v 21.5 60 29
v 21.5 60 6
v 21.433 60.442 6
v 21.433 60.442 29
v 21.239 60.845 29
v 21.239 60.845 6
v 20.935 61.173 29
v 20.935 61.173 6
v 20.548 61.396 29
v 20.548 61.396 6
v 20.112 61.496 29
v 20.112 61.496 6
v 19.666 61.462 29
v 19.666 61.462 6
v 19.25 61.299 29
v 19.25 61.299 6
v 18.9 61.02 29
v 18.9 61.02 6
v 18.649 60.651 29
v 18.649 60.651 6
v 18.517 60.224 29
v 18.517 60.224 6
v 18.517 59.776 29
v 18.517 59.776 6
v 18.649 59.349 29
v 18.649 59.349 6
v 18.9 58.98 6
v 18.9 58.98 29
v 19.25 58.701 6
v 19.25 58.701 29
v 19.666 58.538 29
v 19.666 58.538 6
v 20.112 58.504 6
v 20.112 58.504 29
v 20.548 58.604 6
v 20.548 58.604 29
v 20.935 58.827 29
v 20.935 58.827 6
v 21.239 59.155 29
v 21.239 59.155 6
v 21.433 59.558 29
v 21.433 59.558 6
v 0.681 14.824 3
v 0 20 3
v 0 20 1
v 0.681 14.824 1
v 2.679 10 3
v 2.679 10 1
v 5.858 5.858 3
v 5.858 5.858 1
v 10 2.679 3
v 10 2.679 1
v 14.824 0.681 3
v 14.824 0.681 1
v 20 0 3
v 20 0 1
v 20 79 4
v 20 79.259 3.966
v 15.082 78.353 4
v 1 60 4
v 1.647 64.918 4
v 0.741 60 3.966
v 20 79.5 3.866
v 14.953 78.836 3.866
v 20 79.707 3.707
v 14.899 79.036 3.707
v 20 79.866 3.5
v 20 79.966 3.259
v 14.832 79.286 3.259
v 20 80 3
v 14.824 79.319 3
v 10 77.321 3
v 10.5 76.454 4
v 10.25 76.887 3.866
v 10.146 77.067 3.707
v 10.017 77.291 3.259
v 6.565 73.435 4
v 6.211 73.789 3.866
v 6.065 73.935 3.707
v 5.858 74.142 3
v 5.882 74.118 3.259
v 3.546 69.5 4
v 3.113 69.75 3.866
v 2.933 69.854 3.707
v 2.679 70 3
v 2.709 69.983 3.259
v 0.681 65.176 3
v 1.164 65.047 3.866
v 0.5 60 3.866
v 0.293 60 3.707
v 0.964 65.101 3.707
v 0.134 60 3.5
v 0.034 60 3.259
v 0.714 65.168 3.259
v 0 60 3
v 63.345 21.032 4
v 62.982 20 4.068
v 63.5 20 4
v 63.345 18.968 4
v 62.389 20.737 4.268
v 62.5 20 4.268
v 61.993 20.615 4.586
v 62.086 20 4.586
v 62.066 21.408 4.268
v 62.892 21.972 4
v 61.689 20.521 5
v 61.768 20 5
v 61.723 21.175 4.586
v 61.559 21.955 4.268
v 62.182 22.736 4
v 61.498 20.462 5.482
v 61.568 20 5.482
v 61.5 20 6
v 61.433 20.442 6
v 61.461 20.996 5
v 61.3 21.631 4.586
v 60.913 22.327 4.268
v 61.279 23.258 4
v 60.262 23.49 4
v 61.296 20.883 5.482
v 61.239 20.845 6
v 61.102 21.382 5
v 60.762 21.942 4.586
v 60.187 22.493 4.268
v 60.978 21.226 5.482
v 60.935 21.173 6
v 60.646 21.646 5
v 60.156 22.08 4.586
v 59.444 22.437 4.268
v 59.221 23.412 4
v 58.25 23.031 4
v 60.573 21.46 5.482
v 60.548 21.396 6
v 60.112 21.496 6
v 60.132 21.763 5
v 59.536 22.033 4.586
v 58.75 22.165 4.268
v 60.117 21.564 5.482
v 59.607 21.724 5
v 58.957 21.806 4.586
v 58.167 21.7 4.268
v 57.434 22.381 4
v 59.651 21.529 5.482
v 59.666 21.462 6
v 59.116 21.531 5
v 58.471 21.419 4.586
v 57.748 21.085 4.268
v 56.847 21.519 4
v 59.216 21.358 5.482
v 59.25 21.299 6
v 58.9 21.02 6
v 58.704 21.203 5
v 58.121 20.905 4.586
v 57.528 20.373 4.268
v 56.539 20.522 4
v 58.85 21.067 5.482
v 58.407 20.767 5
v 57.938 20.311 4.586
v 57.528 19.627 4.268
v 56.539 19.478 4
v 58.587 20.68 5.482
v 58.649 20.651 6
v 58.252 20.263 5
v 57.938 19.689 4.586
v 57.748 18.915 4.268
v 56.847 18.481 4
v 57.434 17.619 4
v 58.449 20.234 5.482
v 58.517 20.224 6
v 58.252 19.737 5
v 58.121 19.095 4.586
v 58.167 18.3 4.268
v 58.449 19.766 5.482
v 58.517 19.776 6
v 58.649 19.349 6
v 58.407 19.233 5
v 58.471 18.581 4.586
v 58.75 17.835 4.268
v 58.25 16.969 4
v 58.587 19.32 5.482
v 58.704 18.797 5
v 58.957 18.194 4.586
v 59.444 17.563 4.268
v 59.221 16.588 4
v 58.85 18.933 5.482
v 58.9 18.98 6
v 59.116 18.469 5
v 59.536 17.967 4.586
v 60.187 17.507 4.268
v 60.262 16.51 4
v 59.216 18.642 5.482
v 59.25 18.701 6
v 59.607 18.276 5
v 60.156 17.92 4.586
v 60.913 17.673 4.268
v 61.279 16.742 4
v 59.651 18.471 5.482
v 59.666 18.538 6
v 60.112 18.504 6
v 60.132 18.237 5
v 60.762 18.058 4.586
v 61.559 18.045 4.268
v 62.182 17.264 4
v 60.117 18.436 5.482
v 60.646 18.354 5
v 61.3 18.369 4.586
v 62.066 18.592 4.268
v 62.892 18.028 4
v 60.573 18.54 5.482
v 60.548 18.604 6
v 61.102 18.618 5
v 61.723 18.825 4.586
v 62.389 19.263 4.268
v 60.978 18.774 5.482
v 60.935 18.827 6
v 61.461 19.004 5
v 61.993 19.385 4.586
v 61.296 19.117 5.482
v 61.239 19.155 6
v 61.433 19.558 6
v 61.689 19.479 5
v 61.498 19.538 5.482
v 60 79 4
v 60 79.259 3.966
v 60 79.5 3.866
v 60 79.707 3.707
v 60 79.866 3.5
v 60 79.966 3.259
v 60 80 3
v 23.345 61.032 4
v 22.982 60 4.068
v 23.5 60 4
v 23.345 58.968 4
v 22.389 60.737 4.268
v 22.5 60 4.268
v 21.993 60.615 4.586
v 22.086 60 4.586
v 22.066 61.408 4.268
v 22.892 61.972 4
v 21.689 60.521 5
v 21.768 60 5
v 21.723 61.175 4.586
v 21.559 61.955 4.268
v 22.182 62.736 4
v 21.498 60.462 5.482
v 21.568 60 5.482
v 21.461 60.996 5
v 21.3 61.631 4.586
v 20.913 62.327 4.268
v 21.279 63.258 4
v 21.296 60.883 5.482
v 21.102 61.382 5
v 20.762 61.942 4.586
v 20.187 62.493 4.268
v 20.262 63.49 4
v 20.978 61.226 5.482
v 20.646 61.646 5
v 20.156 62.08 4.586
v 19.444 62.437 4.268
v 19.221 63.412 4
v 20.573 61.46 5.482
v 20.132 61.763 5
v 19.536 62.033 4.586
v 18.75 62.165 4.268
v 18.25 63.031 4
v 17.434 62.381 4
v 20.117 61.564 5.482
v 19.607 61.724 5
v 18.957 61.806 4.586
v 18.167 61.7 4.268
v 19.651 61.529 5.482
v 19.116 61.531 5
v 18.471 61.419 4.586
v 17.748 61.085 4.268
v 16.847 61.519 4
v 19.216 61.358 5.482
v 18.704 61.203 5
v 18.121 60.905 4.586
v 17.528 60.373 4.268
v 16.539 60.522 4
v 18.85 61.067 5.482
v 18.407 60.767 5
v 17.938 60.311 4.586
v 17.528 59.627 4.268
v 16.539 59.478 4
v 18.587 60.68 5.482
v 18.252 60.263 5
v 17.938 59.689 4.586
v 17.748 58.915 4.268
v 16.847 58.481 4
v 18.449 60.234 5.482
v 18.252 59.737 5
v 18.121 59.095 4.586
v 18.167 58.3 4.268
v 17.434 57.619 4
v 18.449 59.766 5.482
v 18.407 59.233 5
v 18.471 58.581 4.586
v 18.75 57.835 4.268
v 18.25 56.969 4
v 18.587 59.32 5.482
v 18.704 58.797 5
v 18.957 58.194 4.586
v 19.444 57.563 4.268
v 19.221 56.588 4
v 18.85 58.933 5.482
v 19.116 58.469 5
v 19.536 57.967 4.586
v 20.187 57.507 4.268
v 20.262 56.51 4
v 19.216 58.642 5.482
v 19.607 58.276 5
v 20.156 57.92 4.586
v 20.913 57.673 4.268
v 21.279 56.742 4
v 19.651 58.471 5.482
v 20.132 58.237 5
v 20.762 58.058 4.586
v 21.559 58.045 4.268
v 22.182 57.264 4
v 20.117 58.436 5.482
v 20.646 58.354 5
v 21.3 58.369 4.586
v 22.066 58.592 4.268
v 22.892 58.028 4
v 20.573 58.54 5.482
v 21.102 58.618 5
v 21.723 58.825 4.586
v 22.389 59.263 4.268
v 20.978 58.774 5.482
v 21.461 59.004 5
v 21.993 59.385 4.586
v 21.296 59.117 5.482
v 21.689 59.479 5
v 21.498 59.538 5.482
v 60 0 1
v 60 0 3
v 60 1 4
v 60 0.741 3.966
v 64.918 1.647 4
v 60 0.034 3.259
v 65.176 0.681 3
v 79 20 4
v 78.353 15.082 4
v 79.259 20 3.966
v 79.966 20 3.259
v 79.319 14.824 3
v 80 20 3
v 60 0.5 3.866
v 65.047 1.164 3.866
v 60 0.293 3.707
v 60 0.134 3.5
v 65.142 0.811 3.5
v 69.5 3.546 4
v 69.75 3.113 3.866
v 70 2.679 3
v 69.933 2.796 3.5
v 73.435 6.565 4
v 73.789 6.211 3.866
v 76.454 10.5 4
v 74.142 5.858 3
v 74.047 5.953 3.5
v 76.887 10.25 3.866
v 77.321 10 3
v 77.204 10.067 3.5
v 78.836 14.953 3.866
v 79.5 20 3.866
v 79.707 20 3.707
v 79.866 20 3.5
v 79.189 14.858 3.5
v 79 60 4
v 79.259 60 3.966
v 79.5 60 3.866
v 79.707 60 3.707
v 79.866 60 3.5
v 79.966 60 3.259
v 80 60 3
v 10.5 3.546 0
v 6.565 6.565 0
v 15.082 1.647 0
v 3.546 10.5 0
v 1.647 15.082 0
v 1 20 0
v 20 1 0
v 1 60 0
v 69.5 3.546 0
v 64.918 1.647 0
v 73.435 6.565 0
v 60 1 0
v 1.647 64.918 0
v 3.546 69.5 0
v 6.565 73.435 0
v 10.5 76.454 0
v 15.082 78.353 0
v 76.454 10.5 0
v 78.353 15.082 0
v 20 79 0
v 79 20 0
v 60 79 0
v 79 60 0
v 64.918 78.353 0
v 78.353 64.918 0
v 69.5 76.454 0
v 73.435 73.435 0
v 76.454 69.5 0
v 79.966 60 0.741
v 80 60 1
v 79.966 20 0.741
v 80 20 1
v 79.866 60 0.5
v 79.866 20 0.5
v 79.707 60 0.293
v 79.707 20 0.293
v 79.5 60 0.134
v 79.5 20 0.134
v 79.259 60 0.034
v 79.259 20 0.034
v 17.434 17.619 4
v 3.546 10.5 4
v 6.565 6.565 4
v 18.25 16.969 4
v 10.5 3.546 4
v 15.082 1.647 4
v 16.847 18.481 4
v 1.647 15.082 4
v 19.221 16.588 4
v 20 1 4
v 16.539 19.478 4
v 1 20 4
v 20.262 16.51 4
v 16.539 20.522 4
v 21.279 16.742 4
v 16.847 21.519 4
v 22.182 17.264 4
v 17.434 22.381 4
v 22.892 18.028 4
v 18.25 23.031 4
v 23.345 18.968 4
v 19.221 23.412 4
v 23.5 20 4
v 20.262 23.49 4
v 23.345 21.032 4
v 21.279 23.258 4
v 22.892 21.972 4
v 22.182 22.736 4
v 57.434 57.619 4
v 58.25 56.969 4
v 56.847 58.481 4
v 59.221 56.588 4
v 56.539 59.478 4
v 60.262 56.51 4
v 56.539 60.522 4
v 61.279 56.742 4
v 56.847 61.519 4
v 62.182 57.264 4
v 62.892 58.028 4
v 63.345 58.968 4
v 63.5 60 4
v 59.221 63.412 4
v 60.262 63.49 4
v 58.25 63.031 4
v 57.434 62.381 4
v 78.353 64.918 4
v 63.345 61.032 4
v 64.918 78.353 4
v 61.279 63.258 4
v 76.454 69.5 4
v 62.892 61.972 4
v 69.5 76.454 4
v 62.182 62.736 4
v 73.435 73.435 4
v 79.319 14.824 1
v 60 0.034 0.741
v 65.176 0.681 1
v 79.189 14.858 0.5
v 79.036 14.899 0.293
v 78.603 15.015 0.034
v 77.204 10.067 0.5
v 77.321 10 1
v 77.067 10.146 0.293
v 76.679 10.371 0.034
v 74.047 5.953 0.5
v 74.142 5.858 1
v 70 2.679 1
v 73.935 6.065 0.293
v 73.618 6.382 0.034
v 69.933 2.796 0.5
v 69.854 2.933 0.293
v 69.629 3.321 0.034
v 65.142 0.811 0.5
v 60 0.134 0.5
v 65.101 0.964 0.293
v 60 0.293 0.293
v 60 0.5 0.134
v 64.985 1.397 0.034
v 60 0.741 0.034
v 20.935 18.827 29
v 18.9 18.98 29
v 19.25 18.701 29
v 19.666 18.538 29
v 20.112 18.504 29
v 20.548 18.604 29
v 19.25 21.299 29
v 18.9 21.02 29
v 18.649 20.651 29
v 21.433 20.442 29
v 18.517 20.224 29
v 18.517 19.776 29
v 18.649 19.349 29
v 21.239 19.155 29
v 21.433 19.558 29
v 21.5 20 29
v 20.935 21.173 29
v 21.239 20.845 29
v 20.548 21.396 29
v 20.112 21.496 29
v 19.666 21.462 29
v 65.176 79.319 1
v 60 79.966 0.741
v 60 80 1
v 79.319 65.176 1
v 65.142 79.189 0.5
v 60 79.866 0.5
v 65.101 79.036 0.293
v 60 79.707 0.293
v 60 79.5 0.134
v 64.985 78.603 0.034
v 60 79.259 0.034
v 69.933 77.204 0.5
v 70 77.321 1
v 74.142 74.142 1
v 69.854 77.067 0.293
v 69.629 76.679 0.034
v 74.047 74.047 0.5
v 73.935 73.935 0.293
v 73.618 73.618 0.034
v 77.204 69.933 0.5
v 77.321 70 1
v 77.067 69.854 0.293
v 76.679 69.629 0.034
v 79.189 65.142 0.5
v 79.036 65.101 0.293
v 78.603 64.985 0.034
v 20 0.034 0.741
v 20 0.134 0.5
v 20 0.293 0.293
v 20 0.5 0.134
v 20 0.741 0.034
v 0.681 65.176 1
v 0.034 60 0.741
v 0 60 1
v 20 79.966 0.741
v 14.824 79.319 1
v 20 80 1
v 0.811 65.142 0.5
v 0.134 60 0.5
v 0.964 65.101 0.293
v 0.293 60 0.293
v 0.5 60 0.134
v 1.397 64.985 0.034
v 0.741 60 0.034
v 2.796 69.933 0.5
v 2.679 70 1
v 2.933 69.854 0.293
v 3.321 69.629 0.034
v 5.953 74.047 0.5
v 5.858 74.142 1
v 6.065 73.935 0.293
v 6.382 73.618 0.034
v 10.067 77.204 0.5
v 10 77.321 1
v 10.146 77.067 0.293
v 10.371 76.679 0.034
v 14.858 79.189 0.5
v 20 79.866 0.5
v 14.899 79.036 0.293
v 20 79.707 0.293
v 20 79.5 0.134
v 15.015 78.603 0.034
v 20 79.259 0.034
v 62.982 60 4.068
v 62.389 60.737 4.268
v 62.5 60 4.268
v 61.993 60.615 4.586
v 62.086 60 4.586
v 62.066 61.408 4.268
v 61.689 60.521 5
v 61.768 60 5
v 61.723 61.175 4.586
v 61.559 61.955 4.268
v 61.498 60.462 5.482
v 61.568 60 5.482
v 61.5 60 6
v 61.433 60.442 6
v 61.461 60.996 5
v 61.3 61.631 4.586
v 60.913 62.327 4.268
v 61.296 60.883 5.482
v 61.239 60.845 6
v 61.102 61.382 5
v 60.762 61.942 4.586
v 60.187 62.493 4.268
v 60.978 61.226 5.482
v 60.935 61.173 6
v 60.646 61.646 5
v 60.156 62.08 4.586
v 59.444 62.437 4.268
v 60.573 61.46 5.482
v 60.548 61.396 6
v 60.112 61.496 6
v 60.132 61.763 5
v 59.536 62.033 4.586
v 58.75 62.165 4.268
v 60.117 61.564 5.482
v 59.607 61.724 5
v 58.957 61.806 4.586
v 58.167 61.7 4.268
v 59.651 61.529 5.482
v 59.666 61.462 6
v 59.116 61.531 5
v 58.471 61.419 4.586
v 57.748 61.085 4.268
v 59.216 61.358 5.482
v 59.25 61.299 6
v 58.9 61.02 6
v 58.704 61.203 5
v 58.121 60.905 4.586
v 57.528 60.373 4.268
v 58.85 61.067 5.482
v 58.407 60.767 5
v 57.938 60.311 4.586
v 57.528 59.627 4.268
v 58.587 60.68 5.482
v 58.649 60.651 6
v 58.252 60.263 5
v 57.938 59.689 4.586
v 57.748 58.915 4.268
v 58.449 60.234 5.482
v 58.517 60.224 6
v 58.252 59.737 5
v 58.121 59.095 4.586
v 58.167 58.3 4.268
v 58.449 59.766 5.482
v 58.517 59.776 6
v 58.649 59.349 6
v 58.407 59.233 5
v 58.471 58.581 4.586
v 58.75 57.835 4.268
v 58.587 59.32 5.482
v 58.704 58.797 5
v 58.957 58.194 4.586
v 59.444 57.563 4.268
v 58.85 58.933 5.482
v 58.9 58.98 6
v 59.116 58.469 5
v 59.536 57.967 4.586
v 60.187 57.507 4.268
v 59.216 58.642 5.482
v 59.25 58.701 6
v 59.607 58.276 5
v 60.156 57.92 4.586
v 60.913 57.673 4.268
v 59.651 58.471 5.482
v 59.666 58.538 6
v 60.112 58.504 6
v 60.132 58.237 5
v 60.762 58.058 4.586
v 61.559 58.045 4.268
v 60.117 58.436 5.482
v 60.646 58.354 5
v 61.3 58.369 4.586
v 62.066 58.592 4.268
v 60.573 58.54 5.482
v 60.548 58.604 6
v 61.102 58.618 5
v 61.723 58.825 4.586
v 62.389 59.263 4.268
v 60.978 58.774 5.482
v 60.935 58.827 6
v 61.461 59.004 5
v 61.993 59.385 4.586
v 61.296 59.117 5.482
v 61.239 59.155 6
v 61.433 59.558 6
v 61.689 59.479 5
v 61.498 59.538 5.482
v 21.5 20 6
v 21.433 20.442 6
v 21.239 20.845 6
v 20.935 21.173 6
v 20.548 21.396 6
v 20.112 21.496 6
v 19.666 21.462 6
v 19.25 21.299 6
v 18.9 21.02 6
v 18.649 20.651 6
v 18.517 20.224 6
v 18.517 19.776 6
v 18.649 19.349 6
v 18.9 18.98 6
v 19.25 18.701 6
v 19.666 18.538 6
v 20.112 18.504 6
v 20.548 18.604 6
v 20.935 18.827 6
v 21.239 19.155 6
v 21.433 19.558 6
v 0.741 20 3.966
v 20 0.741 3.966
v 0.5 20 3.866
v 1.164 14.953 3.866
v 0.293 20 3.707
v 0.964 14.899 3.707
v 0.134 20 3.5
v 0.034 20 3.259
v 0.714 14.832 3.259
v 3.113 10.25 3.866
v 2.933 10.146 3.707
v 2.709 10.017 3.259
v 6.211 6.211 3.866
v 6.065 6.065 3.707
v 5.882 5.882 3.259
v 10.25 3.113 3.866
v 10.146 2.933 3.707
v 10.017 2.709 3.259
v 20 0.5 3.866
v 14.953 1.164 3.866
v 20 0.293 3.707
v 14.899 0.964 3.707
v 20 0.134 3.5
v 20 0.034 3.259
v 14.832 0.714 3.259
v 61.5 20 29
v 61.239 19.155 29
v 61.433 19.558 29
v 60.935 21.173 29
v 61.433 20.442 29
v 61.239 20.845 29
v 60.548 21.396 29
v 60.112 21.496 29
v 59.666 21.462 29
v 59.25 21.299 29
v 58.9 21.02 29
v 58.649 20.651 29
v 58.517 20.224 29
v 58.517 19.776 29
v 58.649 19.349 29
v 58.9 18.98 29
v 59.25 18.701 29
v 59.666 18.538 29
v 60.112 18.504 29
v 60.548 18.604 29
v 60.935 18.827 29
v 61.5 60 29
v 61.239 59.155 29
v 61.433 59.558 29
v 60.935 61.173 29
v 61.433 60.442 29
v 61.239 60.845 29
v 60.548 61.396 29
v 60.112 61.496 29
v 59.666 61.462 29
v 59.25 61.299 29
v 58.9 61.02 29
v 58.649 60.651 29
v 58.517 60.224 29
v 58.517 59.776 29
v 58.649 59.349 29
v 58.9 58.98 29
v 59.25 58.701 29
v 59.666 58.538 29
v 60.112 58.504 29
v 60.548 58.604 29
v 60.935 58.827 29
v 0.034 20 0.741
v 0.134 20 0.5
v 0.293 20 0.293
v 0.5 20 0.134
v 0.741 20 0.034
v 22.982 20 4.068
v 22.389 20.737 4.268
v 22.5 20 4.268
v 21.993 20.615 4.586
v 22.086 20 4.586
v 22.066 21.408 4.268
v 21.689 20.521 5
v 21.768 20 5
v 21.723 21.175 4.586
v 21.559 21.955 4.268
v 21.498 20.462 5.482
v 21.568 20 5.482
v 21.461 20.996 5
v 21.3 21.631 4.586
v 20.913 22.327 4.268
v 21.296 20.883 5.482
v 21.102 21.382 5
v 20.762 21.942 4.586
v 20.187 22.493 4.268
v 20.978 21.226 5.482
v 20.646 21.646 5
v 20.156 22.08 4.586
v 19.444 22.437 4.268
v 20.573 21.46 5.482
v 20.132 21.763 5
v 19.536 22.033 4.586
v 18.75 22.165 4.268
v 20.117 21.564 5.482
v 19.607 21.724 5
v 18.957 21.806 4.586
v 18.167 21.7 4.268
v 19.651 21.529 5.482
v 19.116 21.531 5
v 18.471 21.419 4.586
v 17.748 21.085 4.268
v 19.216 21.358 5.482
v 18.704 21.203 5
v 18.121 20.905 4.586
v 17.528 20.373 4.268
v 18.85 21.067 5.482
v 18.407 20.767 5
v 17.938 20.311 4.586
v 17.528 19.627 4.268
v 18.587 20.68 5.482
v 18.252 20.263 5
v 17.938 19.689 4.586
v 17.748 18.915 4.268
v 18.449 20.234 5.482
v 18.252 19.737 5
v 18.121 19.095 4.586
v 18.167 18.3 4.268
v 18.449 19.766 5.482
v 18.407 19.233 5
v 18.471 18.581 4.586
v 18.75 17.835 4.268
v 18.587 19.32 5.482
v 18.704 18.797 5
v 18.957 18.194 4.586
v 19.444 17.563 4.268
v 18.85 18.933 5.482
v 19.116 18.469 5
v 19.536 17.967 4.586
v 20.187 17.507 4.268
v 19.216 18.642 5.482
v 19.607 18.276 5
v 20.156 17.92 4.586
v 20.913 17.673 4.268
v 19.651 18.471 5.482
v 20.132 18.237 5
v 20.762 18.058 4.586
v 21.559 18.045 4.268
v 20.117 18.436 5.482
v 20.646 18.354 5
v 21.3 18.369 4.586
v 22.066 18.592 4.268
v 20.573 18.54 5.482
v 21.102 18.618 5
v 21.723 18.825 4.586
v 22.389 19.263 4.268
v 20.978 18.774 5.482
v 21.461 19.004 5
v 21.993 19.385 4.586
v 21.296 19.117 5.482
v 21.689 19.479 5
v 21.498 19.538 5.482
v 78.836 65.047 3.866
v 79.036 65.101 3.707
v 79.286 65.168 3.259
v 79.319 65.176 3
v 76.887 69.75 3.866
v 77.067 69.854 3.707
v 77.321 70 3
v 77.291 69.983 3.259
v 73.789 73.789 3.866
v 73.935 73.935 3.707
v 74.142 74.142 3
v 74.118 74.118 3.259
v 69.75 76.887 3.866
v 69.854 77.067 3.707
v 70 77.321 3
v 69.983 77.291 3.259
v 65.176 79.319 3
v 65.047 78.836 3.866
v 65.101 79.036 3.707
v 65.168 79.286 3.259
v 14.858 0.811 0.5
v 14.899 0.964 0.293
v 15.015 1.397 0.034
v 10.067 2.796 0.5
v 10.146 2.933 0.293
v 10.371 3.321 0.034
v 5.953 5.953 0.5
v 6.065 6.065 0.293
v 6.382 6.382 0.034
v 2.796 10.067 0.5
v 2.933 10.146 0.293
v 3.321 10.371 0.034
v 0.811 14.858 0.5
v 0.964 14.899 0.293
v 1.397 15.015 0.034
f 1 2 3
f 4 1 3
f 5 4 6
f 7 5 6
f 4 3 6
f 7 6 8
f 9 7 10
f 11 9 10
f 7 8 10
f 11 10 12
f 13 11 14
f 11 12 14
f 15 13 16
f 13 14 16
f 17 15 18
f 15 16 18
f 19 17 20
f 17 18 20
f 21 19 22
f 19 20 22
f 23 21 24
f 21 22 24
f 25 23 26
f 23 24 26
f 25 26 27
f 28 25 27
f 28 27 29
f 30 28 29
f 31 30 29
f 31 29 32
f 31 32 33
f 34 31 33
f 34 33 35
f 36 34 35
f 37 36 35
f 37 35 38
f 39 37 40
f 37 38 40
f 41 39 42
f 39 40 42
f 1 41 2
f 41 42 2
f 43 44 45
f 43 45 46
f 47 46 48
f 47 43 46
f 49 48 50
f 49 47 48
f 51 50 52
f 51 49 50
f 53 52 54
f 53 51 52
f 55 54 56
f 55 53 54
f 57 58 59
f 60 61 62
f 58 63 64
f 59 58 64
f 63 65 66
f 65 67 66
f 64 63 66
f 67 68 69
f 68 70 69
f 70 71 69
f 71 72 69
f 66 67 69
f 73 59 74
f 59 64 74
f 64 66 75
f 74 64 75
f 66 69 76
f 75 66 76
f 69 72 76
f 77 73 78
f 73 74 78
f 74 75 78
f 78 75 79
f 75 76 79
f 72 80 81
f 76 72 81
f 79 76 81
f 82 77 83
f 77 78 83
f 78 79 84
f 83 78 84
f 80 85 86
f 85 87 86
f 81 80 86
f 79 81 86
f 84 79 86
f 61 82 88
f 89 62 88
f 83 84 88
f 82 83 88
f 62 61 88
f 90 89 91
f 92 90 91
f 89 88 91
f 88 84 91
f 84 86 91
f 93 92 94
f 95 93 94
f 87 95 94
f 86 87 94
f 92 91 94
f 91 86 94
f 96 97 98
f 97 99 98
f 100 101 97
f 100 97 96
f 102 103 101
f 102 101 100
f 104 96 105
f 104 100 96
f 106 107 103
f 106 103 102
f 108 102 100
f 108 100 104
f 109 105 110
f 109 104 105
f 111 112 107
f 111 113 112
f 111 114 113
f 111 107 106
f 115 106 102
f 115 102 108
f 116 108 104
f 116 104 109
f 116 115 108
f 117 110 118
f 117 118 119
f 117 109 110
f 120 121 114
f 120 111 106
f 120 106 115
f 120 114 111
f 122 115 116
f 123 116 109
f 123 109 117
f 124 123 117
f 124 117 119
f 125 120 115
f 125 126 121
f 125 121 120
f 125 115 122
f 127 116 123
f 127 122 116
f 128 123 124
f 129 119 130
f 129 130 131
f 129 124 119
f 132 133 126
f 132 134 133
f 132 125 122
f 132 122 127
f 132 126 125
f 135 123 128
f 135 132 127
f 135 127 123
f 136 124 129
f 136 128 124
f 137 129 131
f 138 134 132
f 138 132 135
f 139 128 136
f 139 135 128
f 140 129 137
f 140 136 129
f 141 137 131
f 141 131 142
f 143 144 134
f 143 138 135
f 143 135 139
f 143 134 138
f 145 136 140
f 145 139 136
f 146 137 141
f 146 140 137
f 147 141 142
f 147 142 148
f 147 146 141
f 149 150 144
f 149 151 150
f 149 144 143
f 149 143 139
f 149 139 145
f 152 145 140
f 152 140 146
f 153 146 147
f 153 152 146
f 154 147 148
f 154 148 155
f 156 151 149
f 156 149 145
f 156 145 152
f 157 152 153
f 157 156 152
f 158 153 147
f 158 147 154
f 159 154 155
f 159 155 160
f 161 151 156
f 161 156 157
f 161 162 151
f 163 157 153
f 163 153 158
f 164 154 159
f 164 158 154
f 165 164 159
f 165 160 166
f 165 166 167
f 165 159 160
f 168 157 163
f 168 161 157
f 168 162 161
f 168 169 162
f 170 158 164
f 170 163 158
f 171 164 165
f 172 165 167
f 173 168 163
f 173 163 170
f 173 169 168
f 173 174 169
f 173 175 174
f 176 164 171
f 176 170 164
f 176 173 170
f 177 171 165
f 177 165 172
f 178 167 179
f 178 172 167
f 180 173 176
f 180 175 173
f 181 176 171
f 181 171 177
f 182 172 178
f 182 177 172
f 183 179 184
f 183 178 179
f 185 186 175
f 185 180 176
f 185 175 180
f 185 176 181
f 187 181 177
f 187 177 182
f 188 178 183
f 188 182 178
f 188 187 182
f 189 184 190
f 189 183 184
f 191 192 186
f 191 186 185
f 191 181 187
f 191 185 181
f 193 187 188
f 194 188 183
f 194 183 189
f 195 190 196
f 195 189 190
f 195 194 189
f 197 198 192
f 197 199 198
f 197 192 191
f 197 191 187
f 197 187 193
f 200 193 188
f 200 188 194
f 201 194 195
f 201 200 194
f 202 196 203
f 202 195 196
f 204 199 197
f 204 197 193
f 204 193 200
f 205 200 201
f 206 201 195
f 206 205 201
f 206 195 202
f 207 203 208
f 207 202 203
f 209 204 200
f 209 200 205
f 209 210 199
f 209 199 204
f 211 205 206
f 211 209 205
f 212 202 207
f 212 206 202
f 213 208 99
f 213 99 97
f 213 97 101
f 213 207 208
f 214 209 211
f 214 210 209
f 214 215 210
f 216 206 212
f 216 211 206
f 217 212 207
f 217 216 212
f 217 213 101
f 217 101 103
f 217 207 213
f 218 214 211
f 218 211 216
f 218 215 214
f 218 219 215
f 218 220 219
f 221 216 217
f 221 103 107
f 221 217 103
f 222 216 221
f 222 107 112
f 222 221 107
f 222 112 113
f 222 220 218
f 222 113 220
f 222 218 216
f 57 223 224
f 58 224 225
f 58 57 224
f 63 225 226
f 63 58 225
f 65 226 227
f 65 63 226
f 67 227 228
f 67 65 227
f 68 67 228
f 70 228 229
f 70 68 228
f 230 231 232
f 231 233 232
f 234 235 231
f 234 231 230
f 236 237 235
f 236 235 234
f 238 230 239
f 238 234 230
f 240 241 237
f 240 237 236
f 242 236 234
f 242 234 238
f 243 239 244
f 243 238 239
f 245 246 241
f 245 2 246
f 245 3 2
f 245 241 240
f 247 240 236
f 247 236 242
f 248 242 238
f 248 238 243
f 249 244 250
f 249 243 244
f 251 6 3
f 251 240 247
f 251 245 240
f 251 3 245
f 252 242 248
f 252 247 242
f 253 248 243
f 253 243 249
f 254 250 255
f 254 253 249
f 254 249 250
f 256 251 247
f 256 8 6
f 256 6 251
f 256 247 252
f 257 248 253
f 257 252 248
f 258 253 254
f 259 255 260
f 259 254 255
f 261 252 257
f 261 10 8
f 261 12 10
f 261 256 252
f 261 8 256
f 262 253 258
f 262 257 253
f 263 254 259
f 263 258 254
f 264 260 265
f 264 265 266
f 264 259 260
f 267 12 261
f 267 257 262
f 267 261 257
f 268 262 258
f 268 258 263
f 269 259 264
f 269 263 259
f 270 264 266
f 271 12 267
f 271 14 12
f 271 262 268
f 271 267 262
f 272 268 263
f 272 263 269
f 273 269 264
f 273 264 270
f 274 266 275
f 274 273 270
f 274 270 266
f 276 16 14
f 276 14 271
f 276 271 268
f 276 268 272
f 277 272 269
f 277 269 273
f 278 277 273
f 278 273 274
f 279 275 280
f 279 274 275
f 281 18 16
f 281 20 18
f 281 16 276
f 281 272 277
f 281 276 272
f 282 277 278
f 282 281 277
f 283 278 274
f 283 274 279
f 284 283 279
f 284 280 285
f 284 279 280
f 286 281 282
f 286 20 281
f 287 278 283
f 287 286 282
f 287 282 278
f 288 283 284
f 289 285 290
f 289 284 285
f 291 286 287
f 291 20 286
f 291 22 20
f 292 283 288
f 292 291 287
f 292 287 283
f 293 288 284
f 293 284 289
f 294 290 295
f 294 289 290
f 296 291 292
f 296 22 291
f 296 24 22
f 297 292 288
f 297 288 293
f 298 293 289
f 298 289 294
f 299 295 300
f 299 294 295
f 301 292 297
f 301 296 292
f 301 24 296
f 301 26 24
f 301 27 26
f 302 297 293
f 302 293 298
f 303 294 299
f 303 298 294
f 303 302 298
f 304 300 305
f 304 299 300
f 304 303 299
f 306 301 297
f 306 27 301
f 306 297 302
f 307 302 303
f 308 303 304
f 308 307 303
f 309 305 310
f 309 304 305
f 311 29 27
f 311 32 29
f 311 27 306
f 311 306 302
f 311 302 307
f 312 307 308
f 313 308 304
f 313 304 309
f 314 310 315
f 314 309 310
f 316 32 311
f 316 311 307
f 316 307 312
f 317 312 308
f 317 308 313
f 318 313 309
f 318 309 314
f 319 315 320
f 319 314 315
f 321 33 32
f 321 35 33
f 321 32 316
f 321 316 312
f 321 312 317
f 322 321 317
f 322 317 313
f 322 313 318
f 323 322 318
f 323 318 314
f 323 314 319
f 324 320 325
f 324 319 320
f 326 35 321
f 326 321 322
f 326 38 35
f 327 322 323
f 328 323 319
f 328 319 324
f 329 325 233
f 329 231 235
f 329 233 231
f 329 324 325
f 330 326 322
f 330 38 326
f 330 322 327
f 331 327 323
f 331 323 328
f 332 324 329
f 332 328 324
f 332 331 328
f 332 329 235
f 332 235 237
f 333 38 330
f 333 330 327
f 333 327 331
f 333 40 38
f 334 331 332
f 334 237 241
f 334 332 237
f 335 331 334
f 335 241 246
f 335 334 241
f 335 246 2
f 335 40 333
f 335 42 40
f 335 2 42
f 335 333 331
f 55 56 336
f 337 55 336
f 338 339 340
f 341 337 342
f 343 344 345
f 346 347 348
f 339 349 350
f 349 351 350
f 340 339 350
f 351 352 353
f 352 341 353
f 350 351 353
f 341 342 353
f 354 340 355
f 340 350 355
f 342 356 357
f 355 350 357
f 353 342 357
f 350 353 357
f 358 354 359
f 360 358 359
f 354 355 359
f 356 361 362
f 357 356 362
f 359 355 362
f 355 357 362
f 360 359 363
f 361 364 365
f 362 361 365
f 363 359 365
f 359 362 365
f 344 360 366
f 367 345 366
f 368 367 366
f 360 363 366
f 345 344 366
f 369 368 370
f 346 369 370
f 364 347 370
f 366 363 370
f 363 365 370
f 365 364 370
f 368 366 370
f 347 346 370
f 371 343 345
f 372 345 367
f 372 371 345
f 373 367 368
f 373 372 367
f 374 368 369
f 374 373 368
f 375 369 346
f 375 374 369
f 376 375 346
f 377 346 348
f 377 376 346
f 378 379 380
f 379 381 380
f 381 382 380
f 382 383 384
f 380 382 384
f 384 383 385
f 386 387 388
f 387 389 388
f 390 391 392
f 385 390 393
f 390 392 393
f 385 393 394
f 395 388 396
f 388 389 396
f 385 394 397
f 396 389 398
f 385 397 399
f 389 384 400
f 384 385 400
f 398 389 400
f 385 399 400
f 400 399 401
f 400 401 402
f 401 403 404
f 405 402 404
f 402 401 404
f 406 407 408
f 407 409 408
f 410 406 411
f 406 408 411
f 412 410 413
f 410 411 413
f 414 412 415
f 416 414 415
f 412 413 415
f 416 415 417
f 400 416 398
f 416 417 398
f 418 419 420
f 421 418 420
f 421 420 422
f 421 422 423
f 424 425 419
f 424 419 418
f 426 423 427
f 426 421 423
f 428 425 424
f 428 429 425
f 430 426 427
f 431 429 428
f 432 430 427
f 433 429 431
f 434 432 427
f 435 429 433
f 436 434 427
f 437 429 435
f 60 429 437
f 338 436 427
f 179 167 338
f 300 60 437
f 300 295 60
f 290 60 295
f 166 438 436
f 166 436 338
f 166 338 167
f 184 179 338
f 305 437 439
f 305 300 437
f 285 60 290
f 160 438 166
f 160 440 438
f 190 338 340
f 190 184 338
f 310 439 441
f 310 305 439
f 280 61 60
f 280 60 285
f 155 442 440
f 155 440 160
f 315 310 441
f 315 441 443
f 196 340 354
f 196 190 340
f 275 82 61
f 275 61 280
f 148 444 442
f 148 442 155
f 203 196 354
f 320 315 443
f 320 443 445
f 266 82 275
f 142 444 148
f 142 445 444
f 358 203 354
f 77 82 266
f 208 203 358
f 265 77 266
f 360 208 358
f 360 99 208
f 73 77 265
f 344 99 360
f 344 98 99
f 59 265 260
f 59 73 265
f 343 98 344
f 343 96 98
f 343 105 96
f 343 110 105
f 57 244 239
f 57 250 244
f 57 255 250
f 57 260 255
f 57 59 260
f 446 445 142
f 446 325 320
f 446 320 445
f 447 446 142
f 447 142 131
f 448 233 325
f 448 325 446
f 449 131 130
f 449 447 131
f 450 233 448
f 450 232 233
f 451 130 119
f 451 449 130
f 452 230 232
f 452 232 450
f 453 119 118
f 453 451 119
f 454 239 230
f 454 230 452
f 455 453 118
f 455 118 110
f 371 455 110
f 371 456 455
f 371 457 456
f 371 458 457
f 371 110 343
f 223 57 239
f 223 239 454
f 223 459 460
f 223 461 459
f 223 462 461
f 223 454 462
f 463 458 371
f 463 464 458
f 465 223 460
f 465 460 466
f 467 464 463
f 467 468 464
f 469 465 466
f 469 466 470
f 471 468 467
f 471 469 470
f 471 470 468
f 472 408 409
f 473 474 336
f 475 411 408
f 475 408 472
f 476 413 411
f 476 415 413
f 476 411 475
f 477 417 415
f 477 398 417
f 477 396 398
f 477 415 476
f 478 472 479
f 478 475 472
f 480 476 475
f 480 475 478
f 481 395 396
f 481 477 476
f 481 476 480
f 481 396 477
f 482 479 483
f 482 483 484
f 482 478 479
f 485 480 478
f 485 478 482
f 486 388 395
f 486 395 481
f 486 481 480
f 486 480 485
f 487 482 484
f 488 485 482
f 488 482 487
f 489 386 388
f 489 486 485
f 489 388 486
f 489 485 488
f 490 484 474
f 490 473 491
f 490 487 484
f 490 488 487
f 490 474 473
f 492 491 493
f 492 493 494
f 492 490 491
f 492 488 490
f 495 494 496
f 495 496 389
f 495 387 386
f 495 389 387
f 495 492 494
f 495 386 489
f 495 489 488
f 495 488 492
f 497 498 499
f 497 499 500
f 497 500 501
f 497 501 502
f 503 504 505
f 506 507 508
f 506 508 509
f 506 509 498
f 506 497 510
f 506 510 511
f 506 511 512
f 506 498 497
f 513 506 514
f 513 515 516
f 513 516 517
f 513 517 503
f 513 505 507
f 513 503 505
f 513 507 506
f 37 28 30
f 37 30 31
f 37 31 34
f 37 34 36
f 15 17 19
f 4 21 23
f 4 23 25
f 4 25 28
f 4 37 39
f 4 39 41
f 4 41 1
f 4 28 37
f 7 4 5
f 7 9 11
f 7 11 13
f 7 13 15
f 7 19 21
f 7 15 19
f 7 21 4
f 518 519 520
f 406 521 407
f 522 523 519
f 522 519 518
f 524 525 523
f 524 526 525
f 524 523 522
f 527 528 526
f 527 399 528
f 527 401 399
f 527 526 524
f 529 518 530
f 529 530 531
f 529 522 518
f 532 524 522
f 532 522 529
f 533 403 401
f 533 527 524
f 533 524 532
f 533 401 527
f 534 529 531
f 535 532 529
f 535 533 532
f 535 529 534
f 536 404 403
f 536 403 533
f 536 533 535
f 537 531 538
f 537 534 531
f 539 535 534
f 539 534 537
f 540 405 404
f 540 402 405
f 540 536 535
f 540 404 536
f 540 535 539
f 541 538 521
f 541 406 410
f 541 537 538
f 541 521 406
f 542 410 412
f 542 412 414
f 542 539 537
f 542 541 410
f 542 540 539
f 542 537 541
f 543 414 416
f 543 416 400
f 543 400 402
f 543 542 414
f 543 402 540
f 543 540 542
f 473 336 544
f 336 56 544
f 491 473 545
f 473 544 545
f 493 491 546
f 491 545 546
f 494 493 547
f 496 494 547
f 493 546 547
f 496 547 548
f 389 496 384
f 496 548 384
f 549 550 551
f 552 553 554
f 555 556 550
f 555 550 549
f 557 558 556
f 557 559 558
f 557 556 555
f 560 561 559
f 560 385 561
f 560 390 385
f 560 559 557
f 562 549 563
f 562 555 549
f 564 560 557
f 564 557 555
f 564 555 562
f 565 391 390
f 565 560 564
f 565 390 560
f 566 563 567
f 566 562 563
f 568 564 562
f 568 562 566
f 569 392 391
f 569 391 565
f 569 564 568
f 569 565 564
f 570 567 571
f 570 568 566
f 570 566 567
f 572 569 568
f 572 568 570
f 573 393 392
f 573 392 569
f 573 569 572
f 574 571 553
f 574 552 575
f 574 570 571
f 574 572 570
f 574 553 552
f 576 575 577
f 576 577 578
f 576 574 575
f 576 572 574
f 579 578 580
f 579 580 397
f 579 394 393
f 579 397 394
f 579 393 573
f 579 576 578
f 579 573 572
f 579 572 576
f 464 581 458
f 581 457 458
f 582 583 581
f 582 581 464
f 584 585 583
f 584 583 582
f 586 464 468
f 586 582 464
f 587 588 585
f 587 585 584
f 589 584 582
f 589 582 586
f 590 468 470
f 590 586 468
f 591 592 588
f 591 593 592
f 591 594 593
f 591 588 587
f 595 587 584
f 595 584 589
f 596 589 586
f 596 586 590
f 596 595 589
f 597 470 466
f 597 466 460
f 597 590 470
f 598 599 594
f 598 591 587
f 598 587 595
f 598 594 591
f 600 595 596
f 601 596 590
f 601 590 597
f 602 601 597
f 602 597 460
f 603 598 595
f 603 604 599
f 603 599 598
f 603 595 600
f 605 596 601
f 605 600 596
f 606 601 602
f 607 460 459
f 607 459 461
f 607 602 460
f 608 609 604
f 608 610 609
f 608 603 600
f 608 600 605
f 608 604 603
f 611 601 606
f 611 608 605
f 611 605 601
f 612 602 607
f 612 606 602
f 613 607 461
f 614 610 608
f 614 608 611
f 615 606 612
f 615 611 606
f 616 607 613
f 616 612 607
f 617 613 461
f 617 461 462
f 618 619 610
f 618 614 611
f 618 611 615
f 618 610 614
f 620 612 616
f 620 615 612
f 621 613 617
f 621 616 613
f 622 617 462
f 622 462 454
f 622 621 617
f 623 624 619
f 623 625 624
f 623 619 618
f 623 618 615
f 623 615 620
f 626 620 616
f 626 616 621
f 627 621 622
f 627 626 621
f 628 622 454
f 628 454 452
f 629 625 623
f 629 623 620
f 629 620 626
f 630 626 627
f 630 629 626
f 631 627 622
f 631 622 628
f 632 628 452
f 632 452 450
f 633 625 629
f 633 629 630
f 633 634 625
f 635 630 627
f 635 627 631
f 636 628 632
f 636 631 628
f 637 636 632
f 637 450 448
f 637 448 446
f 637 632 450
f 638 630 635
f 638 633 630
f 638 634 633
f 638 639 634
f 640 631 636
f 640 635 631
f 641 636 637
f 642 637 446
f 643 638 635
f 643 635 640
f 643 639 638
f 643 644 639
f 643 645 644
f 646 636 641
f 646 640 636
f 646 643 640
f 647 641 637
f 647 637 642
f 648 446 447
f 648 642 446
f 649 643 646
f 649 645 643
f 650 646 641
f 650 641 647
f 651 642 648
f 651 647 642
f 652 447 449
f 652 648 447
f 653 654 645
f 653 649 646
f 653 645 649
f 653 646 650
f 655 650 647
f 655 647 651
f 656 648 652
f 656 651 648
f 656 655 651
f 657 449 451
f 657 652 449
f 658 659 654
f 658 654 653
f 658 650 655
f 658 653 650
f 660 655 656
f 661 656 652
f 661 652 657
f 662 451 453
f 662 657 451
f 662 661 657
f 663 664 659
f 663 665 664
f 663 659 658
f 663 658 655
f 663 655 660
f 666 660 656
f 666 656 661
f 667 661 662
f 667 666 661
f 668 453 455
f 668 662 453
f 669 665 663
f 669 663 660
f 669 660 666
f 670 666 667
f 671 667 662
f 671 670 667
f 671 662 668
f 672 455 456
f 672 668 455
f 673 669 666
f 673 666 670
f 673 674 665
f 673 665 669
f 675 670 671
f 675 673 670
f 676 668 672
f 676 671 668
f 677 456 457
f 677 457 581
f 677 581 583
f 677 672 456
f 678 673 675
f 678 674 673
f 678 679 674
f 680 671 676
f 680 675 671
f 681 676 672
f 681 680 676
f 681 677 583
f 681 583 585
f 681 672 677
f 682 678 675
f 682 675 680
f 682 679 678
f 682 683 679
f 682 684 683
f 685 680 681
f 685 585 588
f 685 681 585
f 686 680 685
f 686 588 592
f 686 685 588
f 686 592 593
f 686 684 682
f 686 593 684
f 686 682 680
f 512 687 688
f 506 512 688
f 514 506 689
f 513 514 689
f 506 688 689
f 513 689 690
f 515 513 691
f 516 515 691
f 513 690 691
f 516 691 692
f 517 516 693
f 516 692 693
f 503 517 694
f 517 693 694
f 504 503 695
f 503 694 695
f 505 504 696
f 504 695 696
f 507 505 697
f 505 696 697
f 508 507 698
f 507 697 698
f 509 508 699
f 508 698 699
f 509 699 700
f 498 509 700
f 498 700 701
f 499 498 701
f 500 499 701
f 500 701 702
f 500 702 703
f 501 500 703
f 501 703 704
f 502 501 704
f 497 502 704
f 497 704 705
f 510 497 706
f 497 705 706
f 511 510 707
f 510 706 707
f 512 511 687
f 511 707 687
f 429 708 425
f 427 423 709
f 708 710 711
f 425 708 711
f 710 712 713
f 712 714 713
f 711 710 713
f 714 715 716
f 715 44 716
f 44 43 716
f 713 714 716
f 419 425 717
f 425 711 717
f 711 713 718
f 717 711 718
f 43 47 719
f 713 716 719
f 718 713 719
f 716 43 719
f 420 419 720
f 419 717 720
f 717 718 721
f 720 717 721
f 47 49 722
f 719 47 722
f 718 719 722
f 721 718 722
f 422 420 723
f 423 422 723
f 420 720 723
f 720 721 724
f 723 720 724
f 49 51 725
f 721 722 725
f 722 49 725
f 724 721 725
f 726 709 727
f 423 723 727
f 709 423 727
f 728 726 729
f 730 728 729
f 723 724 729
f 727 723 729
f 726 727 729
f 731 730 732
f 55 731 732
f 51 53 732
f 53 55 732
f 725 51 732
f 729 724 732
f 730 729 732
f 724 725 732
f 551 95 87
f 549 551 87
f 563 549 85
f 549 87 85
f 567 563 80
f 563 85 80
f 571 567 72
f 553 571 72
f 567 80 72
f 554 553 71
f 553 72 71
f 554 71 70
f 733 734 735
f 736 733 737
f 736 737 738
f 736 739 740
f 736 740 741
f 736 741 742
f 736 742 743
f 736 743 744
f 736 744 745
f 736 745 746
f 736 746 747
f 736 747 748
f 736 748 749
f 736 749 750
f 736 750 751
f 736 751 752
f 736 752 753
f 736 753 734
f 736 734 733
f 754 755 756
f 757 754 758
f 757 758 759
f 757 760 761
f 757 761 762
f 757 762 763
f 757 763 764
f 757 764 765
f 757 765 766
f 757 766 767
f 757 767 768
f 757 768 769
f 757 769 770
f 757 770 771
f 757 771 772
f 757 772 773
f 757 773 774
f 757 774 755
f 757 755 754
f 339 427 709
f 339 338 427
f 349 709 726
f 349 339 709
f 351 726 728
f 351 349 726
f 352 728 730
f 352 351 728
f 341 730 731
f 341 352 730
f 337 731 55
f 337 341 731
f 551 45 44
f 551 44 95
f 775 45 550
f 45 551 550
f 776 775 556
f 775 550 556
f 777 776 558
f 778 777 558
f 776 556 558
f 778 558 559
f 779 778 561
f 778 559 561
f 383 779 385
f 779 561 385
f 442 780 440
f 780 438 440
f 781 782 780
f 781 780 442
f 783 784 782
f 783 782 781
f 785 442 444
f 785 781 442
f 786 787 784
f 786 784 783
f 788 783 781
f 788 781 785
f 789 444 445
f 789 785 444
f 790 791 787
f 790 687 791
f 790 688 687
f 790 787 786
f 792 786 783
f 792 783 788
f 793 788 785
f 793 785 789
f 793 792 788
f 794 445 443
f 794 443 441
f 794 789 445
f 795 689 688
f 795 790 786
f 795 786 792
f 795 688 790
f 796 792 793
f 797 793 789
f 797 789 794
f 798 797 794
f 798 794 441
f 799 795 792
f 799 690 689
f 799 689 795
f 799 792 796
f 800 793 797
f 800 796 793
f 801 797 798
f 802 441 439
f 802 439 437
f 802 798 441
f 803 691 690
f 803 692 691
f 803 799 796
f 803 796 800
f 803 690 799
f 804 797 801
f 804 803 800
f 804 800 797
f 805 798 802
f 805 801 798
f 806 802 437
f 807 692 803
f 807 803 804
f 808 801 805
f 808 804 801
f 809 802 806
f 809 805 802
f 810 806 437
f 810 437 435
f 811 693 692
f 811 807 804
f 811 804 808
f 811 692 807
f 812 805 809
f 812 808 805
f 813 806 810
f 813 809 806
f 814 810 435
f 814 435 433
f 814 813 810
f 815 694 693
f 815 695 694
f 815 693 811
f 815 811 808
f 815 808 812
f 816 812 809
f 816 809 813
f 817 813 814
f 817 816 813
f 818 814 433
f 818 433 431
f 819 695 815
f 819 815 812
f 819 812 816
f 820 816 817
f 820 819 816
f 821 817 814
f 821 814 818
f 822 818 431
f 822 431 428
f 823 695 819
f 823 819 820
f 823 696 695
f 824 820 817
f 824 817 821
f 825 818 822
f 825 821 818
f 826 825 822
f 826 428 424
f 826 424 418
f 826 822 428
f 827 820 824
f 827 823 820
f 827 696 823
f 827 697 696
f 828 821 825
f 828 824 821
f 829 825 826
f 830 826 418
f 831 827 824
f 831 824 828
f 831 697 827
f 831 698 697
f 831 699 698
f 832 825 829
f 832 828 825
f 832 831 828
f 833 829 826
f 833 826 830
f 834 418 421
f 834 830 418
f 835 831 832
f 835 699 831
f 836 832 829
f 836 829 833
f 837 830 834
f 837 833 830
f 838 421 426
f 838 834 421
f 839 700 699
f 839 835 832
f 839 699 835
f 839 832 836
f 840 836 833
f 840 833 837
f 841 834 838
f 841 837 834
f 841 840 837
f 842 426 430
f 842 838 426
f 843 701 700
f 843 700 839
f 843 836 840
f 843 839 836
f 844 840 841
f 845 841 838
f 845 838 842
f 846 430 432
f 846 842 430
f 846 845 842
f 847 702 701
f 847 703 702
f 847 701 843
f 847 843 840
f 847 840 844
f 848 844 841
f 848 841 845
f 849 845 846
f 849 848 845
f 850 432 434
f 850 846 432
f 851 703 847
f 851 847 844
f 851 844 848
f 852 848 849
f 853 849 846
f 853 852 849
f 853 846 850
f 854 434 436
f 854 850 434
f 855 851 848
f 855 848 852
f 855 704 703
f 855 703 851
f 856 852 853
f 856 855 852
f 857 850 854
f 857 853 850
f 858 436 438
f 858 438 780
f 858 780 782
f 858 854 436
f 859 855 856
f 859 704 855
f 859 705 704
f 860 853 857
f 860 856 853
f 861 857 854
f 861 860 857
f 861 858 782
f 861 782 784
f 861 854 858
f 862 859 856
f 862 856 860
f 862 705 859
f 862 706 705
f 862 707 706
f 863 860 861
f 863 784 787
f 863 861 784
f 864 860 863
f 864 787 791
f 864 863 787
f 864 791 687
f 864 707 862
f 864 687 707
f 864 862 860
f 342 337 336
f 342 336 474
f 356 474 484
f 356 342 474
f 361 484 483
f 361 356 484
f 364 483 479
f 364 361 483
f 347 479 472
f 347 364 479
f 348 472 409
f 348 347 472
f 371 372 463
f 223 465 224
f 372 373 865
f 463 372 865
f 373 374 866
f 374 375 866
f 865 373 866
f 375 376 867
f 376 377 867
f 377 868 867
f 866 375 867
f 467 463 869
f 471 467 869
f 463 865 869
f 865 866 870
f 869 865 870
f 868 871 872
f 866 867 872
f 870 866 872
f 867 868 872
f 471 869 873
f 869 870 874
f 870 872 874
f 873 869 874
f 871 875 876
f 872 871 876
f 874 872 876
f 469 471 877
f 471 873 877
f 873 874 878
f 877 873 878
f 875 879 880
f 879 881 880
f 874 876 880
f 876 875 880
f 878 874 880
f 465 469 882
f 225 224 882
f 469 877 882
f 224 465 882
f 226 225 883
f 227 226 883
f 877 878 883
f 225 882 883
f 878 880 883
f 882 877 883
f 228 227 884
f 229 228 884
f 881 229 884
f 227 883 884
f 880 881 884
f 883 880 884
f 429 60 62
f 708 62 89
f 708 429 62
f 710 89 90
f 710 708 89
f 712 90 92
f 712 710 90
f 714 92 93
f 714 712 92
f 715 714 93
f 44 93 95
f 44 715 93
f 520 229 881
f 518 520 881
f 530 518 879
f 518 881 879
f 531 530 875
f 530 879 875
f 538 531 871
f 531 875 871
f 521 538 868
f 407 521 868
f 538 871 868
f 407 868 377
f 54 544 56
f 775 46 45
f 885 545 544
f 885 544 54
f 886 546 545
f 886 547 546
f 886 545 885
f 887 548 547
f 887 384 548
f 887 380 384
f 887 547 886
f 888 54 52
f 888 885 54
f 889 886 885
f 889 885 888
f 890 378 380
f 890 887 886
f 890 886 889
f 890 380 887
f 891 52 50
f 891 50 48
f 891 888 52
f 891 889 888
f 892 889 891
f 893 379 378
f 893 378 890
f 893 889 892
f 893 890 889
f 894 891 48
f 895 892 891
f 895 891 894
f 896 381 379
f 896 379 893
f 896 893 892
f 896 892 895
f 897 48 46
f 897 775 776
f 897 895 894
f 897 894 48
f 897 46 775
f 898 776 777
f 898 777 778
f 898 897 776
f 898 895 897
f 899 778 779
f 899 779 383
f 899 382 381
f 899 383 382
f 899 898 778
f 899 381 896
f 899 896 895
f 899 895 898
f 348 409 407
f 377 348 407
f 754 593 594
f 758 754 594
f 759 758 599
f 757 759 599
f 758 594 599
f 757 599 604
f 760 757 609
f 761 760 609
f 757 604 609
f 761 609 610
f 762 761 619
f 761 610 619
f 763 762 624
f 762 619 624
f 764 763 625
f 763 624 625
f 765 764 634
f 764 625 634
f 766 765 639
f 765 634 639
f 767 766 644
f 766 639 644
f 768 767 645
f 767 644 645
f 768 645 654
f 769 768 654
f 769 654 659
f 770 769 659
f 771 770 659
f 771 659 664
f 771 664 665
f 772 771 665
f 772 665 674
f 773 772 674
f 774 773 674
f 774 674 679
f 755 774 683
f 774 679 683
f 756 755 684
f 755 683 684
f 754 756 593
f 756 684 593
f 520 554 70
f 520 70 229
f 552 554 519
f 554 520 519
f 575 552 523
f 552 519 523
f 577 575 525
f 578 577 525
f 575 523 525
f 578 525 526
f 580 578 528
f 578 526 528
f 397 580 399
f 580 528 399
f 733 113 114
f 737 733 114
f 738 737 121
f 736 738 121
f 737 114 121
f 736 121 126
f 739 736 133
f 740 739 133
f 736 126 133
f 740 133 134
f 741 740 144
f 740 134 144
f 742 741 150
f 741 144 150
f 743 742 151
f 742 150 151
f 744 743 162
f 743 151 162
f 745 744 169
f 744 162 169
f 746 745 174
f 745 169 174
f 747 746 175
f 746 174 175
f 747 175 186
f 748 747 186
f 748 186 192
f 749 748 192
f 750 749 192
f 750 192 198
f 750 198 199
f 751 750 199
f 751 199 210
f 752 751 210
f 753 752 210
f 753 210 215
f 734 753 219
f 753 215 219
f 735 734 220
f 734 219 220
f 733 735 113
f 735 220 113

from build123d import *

# Parameters (mm, degrees)
SKETCH_W     = 80
SKETCH_H     = 80
PAD_DEPTH    = 4
SKETCH001_R  = 1.5
PAD001_DEPTH = 25
FILLET_R     = 20
FILLET001_R  = 2
FILLET002_R  = 1
FILLET003_R  = 1


with BuildPart() as part:
    # Sketch → Pad (new body)
    with BuildSketch(Plane.XY):
        with Locations((40, 40)):
            Rectangle(SKETCH_W, SKETCH_H)
    extrude(amount=PAD_DEPTH)

    # Sketch001 (on Face6 of Pad) → Pad001 (join)
    with BuildSketch(Plane.XY.offset(4)):
        with Locations((20, 60)):
            Circle(SKETCH001_R)
        with Locations((60, 60)):
            Circle(SKETCH001_R)
        with Locations((20, 20)):
            Circle(SKETCH001_R)
        with Locations((60, 20)):
            Circle(SKETCH001_R)
    extrude(amount=PAD001_DEPTH)

    # Fillet
    fillet_edges = [part.edges().sort_by_distance(p)[0] for p in [
        (0, 80, 2),
        (80, 80, 2),
        (80, 0, 2),
        (0, 0, 2),
    ]]
    fillet(fillet_edges, radius=FILLET_R)

    # Fillet001
    fillet001_edges = [part.edges().sort_by_distance(p)[0] for p in [
        (18.5, 60, 4),
        (18.5, 20, 4),
        (58.5, 20, 4),
        (58.5, 60, 4),
    ]]
    fillet(fillet001_edges, radius=FILLET001_R)

    # Fillet002
    fillet002_edges = [part.edges().sort_by_distance(p)[0] for p in [
        (40, 80, 0),
        (5.857864, 74.142136, 0),
        (74.142136, 74.142136, 0),
        (0, 40, 0),
        (80, 40, 0),
        (5.857864, 5.857864, 0),
        (74.142136, 5.857864, 0),
        (40, 0, 0),
    ]]
    fillet(fillet002_edges, radius=FILLET002_R)

    # Fillet003
    fillet003_edges = [part.edges().sort_by_distance(p)[0] for p in [
        (74.142136, 5.857864, 4),
        (80, 40, 4),
        (74.142136, 74.142136, 4),
        (40, 80, 4),
        (5.857864, 74.142136, 4),
        (0, 40, 4),
        (5.857864, 5.857864, 4),
        (40, 0, 4),
    ]]
    fillet(fillet003_edges, radius=FILLET003_R)


solid = part.part
